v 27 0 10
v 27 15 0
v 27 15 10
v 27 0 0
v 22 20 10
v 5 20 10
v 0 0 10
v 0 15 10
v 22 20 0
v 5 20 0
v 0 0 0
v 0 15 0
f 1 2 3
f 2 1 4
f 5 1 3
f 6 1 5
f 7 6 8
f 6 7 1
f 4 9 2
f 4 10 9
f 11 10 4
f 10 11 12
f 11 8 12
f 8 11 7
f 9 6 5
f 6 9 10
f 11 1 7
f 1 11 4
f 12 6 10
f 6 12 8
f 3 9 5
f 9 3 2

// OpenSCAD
230V_chassisdeel();

module 230V_chassisdeel() {
 difference() {
  cube([27,20,10]);
  translate([0,15,-1]) rotate([0,0,45]) cube([7.5,7.5,12]);
  translate([27,15,-1]) rotate([0,0,45]) cube([7.5,7.5,12]);
 }
}
